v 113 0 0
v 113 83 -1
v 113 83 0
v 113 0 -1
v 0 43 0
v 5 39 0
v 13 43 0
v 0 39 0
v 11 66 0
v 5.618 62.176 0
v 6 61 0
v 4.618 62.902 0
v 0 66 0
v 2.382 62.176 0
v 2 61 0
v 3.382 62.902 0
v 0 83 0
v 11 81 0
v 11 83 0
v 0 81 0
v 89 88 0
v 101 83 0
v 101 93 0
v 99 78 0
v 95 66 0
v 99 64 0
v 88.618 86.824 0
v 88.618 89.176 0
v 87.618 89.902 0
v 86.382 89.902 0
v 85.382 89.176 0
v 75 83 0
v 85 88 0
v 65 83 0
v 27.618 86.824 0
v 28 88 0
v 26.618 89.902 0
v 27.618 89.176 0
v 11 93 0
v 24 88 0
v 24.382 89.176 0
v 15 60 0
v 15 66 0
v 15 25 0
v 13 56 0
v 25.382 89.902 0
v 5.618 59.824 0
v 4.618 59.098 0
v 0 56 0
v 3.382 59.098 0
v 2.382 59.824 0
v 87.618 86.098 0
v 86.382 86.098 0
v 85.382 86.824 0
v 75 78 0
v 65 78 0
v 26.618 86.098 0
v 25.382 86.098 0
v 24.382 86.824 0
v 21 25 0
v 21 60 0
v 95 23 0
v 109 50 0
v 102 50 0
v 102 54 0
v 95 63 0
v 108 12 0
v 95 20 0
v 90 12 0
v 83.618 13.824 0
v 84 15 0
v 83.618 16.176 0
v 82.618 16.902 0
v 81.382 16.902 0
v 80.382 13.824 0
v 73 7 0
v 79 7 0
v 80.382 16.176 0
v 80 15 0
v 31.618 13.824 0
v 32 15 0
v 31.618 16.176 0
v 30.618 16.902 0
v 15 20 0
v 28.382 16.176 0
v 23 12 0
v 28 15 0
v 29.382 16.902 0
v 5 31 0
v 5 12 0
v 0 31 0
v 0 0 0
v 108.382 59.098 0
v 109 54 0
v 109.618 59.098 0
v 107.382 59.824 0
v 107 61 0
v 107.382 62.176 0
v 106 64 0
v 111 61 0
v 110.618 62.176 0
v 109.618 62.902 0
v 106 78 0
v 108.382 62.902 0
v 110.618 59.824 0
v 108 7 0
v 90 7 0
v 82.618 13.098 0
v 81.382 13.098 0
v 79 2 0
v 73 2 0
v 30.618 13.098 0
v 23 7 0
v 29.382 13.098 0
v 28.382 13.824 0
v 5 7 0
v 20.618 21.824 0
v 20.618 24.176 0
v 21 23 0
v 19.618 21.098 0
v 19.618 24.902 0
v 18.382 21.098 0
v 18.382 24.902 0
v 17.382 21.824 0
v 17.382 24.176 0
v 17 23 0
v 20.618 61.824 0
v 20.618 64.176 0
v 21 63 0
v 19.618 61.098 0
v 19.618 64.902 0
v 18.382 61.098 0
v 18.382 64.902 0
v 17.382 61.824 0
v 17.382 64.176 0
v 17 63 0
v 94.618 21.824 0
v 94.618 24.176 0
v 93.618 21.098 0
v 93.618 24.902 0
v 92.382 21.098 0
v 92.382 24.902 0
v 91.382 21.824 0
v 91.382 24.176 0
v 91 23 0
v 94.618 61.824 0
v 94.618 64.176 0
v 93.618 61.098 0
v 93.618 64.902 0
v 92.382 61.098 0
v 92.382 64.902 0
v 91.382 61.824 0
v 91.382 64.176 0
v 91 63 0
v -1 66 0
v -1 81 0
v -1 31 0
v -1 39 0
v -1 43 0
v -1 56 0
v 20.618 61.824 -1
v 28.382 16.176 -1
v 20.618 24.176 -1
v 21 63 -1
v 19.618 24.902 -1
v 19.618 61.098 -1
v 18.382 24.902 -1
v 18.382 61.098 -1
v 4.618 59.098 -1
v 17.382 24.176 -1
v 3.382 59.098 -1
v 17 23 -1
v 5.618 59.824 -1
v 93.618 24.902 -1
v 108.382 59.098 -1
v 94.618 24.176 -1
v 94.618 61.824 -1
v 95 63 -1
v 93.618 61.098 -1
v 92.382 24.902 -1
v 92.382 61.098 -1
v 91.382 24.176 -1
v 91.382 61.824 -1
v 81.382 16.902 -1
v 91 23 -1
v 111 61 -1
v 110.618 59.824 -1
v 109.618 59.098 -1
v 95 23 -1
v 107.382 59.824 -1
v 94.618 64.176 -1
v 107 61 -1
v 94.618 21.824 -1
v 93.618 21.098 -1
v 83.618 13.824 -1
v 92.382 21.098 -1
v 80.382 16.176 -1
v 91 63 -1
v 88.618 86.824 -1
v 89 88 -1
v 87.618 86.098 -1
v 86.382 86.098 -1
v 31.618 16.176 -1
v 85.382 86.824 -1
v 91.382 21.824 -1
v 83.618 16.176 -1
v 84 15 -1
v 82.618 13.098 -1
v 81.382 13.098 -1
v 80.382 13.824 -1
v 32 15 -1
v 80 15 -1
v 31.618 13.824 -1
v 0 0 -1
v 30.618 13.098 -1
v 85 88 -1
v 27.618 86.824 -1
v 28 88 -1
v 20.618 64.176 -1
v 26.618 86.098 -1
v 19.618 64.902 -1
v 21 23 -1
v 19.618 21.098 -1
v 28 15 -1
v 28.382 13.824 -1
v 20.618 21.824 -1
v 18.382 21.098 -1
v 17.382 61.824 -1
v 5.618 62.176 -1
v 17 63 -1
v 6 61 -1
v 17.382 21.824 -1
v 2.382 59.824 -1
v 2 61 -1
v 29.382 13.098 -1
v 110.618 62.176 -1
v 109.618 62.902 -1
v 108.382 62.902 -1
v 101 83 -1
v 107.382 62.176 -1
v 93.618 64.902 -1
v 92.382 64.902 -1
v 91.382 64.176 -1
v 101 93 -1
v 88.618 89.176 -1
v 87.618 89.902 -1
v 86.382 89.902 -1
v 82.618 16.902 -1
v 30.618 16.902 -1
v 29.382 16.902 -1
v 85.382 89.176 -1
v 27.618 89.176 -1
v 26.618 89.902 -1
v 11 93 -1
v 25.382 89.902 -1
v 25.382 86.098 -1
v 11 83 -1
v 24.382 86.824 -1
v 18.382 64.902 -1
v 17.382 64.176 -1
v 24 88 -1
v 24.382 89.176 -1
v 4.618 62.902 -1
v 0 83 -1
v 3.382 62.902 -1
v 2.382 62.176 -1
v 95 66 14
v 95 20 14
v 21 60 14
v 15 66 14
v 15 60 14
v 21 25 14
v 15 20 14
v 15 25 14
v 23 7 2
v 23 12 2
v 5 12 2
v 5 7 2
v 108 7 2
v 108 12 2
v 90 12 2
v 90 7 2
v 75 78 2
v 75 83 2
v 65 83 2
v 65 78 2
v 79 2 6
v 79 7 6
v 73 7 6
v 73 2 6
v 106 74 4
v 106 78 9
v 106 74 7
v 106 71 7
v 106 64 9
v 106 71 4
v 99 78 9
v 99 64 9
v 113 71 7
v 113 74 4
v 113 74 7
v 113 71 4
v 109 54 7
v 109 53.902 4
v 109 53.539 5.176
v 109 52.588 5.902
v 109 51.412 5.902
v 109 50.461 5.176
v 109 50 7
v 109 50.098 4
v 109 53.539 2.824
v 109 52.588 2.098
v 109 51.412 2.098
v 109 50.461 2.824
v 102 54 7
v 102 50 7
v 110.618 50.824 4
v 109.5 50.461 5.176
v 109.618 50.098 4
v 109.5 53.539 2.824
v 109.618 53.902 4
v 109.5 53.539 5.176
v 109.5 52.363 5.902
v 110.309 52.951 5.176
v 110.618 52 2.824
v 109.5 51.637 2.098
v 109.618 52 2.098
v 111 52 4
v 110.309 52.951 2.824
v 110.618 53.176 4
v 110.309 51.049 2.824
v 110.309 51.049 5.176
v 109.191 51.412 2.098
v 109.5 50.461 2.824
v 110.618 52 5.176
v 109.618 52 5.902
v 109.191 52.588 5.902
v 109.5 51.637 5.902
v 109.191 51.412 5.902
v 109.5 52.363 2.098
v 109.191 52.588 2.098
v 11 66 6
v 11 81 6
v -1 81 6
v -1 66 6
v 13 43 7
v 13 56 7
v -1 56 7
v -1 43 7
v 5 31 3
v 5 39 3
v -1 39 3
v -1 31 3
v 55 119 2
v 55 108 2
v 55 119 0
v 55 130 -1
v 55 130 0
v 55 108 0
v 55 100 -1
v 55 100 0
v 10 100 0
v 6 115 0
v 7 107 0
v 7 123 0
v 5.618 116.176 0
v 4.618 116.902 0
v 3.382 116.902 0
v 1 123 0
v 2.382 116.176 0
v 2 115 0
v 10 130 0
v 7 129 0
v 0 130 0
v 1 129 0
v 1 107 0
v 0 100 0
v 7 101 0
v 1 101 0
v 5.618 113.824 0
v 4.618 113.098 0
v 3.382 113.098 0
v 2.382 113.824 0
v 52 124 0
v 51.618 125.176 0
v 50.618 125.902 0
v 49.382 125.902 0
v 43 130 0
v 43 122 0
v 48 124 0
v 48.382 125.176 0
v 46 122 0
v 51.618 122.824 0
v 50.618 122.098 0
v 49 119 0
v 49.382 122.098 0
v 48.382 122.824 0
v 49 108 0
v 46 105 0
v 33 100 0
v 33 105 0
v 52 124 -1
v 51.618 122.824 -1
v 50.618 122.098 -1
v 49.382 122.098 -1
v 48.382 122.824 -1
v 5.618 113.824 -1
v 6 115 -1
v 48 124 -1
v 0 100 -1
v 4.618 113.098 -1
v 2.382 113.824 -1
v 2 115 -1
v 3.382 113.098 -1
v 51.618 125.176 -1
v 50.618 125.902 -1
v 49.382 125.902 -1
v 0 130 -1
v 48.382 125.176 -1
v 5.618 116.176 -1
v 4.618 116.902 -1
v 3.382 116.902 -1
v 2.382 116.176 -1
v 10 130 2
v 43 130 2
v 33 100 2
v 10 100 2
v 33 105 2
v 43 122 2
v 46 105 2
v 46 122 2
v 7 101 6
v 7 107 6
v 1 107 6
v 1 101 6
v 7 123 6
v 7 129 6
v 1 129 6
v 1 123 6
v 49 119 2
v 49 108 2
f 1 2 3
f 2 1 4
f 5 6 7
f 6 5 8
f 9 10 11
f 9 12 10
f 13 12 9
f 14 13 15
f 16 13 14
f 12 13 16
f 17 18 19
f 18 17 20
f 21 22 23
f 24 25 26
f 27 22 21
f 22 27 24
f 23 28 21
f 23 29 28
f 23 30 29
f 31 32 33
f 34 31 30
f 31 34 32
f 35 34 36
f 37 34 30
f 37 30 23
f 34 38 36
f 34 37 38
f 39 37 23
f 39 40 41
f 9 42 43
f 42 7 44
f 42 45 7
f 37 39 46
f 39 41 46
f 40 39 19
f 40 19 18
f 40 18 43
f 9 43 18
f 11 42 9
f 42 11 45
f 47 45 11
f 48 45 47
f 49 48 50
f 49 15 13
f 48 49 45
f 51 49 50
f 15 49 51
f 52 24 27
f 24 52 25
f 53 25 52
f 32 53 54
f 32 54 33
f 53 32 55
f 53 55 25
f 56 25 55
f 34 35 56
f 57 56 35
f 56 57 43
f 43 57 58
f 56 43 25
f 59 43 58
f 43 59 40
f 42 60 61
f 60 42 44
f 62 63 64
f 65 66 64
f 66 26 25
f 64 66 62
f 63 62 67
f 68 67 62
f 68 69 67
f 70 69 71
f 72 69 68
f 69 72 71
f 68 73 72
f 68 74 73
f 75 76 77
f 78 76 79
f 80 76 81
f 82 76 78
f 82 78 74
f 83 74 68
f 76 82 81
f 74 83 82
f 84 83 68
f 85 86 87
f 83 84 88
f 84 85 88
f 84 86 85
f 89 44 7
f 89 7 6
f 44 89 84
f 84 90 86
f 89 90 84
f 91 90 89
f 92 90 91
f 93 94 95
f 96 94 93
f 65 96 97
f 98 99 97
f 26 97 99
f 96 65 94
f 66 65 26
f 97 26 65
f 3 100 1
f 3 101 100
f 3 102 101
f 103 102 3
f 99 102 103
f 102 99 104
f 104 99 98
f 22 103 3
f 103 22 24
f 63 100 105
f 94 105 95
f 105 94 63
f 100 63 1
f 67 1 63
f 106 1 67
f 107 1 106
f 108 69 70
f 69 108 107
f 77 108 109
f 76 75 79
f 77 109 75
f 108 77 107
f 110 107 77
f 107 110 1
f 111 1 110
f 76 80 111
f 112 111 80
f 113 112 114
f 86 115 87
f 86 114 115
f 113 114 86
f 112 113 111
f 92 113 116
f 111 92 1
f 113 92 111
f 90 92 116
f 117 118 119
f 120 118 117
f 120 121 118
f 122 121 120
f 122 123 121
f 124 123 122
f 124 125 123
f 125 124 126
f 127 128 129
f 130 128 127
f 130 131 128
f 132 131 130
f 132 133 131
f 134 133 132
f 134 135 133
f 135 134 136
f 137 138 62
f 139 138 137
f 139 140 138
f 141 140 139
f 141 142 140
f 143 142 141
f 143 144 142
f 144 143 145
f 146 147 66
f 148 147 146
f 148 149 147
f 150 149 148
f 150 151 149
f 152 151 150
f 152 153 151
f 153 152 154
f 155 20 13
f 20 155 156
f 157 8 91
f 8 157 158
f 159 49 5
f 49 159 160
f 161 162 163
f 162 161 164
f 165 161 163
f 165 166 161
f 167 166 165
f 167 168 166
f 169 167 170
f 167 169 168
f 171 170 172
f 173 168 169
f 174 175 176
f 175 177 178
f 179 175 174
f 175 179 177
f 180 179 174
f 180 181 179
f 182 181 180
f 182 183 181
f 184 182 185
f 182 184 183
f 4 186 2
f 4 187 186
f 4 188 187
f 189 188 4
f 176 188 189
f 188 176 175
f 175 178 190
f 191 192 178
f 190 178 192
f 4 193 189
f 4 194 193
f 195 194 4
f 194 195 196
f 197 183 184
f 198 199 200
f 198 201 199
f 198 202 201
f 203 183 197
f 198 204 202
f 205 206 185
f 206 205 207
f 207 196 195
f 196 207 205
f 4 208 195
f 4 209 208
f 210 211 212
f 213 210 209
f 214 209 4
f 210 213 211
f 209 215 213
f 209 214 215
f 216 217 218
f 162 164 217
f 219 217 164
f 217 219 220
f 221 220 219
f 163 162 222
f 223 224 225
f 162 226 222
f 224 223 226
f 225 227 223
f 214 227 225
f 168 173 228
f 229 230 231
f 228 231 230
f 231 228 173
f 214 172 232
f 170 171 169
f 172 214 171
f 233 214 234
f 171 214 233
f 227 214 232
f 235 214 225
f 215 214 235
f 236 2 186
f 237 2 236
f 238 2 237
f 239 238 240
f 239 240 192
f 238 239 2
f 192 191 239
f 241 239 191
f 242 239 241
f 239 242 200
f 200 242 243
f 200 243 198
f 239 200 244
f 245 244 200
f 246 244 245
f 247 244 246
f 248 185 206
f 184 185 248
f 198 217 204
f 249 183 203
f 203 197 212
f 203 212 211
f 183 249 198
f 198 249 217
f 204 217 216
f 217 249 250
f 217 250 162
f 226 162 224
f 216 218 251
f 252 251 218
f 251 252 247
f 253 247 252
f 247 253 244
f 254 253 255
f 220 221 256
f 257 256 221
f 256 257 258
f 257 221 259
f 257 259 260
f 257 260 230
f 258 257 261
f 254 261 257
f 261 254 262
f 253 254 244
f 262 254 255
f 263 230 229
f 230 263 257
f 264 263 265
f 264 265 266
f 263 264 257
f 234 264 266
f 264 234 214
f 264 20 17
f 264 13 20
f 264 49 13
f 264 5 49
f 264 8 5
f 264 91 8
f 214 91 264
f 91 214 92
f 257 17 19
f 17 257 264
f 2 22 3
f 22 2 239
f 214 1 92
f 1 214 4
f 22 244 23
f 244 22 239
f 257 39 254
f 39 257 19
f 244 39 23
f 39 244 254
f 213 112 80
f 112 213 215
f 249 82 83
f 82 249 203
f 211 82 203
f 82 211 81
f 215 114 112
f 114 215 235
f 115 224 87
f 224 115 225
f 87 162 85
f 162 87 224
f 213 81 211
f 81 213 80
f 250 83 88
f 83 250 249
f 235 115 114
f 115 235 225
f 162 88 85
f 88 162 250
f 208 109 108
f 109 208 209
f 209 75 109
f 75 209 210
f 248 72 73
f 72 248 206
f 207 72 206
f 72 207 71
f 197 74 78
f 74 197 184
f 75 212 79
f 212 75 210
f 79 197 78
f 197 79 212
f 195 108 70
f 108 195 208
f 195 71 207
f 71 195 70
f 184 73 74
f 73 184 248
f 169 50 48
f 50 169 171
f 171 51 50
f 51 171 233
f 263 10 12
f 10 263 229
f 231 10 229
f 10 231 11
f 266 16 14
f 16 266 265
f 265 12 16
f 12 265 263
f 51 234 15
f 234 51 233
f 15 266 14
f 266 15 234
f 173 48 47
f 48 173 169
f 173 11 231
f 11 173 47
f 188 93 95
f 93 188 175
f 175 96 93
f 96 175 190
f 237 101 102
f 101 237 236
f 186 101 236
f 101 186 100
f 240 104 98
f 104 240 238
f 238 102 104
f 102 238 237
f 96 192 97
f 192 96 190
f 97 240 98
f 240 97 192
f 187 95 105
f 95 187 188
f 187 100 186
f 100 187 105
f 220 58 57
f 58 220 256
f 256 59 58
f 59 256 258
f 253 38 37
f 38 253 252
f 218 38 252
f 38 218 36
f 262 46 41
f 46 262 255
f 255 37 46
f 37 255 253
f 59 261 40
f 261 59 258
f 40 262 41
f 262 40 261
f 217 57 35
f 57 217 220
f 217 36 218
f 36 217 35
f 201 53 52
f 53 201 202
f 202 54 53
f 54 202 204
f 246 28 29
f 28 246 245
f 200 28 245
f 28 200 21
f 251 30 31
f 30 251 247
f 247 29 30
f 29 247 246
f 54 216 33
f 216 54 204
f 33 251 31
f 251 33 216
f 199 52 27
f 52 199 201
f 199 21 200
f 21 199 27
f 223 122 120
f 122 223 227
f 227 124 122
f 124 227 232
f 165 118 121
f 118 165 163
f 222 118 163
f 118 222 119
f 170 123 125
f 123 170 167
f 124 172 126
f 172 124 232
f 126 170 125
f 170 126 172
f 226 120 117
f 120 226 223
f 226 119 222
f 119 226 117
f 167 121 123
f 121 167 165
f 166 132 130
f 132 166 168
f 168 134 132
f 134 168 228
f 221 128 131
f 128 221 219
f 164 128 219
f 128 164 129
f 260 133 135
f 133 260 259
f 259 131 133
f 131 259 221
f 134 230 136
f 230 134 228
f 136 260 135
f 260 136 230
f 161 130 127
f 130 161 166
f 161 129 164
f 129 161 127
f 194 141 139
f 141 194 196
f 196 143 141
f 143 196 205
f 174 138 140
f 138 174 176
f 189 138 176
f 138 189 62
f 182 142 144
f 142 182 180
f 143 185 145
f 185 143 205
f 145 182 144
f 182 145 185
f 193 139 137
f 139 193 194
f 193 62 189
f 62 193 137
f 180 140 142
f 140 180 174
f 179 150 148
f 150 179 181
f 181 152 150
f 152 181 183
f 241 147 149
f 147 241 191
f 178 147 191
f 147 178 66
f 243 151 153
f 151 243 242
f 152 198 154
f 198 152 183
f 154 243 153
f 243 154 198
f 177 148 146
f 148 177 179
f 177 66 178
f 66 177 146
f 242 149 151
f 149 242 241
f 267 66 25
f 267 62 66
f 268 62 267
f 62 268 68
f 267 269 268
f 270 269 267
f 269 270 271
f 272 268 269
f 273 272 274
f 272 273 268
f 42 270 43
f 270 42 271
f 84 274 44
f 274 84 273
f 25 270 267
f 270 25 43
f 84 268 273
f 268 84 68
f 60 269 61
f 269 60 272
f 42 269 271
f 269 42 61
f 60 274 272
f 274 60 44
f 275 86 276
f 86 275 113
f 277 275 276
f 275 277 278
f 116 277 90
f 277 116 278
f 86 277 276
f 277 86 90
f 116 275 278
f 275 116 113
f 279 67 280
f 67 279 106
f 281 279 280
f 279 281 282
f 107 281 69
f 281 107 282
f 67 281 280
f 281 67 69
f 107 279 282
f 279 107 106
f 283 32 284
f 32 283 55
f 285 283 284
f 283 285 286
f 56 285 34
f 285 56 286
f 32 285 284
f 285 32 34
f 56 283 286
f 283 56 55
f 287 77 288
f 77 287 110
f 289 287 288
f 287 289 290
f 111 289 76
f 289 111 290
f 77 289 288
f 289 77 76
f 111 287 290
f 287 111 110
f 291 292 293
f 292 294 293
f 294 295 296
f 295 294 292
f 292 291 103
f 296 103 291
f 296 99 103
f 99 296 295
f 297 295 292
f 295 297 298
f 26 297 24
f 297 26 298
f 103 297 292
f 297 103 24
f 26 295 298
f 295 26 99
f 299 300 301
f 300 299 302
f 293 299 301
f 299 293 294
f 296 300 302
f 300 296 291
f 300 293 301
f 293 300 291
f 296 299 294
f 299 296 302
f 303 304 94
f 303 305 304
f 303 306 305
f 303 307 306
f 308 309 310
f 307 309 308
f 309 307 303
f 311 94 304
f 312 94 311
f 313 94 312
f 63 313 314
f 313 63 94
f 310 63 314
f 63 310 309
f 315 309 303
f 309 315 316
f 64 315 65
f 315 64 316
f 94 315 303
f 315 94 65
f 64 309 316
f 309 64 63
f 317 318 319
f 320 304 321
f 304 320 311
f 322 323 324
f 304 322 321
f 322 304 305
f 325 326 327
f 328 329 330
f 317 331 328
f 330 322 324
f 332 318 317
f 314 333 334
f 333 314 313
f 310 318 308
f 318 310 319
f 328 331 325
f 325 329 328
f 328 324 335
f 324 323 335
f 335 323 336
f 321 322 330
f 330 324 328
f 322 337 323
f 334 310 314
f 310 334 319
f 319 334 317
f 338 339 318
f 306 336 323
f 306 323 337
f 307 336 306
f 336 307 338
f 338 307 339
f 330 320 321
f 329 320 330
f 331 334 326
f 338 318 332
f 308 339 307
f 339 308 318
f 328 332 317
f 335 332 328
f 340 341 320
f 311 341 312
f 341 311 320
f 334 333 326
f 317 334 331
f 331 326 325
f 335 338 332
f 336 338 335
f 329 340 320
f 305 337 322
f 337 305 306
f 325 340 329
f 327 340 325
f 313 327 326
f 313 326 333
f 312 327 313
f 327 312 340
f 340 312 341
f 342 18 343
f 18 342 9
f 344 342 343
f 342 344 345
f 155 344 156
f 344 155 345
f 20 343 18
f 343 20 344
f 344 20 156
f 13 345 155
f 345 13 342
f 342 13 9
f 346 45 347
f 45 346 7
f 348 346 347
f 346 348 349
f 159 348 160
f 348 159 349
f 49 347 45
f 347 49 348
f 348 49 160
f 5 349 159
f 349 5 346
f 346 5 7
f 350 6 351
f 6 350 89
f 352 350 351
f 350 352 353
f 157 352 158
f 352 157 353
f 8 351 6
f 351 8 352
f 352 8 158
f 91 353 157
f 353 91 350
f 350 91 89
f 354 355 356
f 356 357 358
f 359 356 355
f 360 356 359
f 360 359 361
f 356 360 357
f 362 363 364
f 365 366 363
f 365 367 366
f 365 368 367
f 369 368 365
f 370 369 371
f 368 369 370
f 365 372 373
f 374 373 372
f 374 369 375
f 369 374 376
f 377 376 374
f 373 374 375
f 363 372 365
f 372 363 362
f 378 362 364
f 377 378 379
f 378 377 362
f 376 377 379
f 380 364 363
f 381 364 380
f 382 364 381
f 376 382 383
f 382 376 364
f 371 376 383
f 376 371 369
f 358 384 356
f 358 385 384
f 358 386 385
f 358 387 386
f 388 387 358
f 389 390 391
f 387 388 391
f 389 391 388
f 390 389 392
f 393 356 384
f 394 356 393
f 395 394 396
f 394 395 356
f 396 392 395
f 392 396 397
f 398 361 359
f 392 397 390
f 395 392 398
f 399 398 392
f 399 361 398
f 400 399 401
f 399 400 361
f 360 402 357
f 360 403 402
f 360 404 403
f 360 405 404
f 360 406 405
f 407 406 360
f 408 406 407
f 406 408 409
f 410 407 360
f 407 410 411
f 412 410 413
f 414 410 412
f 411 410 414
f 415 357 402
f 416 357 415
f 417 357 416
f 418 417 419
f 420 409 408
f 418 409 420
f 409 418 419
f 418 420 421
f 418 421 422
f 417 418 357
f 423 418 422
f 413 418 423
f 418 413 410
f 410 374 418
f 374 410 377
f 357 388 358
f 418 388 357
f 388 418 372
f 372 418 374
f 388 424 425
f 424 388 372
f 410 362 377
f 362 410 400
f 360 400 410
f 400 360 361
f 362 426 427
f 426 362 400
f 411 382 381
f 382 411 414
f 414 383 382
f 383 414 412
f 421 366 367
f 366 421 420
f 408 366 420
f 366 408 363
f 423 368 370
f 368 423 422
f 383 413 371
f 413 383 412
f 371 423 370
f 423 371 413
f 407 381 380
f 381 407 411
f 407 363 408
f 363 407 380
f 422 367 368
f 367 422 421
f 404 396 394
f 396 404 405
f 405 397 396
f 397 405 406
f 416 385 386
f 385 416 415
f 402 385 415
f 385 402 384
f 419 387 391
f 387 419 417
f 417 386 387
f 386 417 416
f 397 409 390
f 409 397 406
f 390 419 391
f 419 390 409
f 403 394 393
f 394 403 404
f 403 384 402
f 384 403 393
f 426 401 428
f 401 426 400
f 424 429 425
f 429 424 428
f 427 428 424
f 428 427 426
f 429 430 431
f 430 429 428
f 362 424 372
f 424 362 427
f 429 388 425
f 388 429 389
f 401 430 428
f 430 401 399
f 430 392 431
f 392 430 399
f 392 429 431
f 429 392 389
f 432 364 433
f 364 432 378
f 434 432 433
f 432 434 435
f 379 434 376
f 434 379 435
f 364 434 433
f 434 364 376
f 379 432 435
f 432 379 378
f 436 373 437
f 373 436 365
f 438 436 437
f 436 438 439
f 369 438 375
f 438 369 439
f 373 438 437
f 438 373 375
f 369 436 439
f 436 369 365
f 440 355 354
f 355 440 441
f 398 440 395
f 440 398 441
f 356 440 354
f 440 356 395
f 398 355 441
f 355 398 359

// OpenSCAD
// file: SkyController_Modules.scad
$fn = 10;

// Uplink WiFi Transciever Module (DNUA-P01)
module uplink() {
    difference() {
        color("green") translate([0, 0, -1]) {
            cube([55, 30, 1]);
        }

        // Mounting Holes
        translate([4, 15, -2]) cylinder(3, 2, 2, false);
        translate([50, 24, -2]) cylinder(3, 2, 2, false);
    }

    // Sheilded Block
    union() translate([10, 0, 0]) {
        cube([23, 30, 2]);
        translate([23, 5, 0]) cube([10, 25, 2]);
        translate([33, 5, 0]) cube([3, 17, 2]);
    }

    // SMA Connectors
    color("yellow") translate([1, 1, 0]) cube([6, 6, 6]);
    color("yellow") translate([1, 23, 0]) cube([6, 6, 6]);
    
    // USB Connector
    translate([49, 8, 0]) cube([6, 11,  2]);
}

// MainBoard PCB (NAP_MB_HW03)
module nap_mb() {
    color("green") translate([0, 0, -1]) {
        difference() {
            union() {
                cube([113, 83, 1]);
                translate([11, 83, 0]) cube([90, 10, 1]);
            }

            // Mounting Holes
            translate([30, 15, -1]) cylinder(3, 2, 2, false);
            translate([82, 15, -1]) cylinder(3, 2, 2, false);
            translate([4, 61, -1]) cylinder(3, 2, 2, false);
            translate([109, 61, -1]) cylinder(3, 2, 2, false);
            translate([26, 88, -1]) cylinder(3, 2, 2, false);
            translate([87, 88, -1]) cylinder(3, 2, 2, false);

            // Big Block Mounting Holes
            translate([19, 23, -1]) cylinder(3, 2, 2, false);
            translate([19, 63, -1]) cylinder(3, 2, 2, false);
            translate([93, 23, -1]) cylinder(3, 2, 2, false);
            translate([93, 63, -1]) cylinder(3, 2, 2, false);
        }
    }

    // Big Block
    translate([15, 20, 0]) difference() {
        cube([80, 46, 14]);
        translate([-1, 5, 0]) cube([7, 35, 15]);
    }

    // Connectors
    color("white") {
        translate([5, 7, 0]) cube([18, 5, 2]);
        translate([90, 7, 0]) cube([18, 5, 2]);
        translate([65, 78, 0]) cube([10, 5, 2]);
        translate([73, 2, 0]) cube([6, 5, 6]);
    }


    // Ports & Switches
    color([0.5, 0.5, 0.5]) {
        // HDMI
        translate([-1, 66, 0]) cube([12, 15, 6]);

        // USB Host
        translate([-1, 43, 0]) cube([14, 13, 7]);

        // Micro USB
        translate([-1, 31, 0]) cube([6, 8, 3]);

        // Power Switch
        translate([99, 64, 0]) {
            union() {
                cube([7, 14, 9]);
                translate([7, 7, 4]) cube([7, 3, 3]);
            }
        }

        // Power LED
        translate([102, 50, 0]) {
            cube([7, 4, 7]);
            translate([7, 2, 4]) sphere(r = 2);
        }
    }
}
// main file
include <SkyController_Modules.scad>

nap_mb();
translate([0, 100, 0]) uplink();
